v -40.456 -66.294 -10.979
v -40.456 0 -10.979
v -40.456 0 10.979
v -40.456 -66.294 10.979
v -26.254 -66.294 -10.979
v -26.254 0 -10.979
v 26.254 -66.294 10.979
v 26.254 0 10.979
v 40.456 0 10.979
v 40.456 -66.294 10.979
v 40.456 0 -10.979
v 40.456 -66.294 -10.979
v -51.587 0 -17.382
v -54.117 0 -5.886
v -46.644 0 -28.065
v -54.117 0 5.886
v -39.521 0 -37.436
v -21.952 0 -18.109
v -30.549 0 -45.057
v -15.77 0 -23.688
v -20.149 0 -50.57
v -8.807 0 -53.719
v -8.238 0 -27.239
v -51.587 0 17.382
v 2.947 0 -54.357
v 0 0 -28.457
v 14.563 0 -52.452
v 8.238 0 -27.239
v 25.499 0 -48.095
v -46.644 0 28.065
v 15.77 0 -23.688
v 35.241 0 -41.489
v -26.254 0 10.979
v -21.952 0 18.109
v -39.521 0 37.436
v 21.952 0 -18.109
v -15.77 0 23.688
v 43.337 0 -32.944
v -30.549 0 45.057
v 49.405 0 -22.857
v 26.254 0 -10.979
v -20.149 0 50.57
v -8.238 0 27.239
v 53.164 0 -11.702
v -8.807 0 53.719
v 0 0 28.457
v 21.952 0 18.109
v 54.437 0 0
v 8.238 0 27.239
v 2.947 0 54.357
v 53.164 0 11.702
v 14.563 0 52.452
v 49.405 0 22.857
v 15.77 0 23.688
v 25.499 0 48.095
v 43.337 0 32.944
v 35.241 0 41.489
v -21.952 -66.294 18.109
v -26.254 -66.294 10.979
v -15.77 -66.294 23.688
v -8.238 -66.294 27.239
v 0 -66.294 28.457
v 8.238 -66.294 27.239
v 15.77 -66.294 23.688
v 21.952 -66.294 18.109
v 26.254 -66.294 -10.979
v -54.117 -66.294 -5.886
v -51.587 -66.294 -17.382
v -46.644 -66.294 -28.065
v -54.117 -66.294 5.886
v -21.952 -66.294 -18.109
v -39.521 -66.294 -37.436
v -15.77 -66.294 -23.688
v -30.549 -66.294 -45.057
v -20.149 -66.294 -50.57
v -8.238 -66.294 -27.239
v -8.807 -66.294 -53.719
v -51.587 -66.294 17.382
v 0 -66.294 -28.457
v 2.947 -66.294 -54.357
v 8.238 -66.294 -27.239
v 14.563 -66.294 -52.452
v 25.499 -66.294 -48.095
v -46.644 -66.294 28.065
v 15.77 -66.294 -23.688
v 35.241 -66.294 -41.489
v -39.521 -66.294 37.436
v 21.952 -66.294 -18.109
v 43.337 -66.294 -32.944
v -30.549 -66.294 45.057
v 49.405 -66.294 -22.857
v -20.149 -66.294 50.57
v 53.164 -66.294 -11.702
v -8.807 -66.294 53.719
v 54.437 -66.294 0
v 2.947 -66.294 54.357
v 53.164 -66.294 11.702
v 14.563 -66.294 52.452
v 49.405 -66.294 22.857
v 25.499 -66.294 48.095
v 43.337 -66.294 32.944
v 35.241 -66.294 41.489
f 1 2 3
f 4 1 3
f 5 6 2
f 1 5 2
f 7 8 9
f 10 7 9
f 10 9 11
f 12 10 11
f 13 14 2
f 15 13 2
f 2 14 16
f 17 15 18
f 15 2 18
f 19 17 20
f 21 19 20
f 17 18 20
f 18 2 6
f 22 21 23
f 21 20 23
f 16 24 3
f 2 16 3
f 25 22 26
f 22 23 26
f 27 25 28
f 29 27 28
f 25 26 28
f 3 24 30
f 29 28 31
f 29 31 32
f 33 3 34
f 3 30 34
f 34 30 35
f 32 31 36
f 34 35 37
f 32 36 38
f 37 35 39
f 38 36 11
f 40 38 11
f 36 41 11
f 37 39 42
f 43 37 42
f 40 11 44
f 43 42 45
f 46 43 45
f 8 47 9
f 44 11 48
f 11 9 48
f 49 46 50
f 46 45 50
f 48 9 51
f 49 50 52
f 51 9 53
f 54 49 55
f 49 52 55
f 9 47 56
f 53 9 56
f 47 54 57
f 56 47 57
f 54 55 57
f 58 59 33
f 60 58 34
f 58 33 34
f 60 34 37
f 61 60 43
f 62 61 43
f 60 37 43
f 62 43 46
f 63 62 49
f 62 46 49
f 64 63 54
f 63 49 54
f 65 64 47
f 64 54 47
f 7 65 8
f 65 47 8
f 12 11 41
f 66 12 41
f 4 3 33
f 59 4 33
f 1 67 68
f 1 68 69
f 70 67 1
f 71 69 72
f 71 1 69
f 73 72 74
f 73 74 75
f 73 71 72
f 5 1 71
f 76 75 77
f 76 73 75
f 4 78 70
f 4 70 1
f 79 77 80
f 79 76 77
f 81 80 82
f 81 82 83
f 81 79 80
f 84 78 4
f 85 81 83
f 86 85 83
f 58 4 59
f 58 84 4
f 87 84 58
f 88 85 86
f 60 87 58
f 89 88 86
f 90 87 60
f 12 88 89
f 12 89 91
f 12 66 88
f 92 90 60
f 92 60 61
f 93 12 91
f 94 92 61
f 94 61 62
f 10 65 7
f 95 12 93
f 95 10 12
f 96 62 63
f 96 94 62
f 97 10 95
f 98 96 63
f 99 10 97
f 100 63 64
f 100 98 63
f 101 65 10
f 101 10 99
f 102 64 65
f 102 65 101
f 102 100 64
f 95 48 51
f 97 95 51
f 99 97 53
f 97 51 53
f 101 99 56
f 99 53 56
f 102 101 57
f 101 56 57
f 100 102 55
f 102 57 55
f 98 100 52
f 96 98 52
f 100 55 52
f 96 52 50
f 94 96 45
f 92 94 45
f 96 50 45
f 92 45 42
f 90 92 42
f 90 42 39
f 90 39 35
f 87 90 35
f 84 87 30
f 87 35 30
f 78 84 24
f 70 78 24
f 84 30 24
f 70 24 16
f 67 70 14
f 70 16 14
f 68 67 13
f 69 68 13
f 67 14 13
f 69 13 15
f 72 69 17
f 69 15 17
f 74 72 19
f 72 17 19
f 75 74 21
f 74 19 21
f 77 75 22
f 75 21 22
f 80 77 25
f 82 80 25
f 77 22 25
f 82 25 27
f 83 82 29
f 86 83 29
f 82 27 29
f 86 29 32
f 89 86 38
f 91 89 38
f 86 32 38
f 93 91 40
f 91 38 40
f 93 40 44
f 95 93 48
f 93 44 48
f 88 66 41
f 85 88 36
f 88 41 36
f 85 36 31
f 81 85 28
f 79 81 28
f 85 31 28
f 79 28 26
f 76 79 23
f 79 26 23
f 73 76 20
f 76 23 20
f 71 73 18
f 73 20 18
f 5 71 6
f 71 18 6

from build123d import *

# Parameters (mm, degrees)
F0_R     = 54.436535
F1_DEPTH = 66.294


with BuildPart() as f1:
    # F0 (on Front) → F1 (new body)
    with BuildSketch(Plane.XZ):
        Circle(F0_R)
        with BuildLine():
            ThreePointArc((-26.253978, 10.97882), (0, 28.457088), (26.253978, 10.97882))
            Line((26.253978, 10.97882), (40.456183, 10.97882))
            Line((40.456183, 10.97882), (40.456183, -10.97882))
            Line((40.456183, -10.97882), (26.253978, -10.97882))
            ThreePointArc((26.253978, -10.97882), (0, -28.457088), (-26.253978, -10.97882))
            Line((-26.253978, -10.97882), (-40.456183, -10.97882))
            Line((-40.456183, -10.97882), (-40.456183, 10.97882))
            Line((-40.456183, 10.97882), (-26.253978, 10.97882))
        make_face(mode=Mode.SUBTRACT)
    extrude(amount=F1_DEPTH)


solid = f1.part
